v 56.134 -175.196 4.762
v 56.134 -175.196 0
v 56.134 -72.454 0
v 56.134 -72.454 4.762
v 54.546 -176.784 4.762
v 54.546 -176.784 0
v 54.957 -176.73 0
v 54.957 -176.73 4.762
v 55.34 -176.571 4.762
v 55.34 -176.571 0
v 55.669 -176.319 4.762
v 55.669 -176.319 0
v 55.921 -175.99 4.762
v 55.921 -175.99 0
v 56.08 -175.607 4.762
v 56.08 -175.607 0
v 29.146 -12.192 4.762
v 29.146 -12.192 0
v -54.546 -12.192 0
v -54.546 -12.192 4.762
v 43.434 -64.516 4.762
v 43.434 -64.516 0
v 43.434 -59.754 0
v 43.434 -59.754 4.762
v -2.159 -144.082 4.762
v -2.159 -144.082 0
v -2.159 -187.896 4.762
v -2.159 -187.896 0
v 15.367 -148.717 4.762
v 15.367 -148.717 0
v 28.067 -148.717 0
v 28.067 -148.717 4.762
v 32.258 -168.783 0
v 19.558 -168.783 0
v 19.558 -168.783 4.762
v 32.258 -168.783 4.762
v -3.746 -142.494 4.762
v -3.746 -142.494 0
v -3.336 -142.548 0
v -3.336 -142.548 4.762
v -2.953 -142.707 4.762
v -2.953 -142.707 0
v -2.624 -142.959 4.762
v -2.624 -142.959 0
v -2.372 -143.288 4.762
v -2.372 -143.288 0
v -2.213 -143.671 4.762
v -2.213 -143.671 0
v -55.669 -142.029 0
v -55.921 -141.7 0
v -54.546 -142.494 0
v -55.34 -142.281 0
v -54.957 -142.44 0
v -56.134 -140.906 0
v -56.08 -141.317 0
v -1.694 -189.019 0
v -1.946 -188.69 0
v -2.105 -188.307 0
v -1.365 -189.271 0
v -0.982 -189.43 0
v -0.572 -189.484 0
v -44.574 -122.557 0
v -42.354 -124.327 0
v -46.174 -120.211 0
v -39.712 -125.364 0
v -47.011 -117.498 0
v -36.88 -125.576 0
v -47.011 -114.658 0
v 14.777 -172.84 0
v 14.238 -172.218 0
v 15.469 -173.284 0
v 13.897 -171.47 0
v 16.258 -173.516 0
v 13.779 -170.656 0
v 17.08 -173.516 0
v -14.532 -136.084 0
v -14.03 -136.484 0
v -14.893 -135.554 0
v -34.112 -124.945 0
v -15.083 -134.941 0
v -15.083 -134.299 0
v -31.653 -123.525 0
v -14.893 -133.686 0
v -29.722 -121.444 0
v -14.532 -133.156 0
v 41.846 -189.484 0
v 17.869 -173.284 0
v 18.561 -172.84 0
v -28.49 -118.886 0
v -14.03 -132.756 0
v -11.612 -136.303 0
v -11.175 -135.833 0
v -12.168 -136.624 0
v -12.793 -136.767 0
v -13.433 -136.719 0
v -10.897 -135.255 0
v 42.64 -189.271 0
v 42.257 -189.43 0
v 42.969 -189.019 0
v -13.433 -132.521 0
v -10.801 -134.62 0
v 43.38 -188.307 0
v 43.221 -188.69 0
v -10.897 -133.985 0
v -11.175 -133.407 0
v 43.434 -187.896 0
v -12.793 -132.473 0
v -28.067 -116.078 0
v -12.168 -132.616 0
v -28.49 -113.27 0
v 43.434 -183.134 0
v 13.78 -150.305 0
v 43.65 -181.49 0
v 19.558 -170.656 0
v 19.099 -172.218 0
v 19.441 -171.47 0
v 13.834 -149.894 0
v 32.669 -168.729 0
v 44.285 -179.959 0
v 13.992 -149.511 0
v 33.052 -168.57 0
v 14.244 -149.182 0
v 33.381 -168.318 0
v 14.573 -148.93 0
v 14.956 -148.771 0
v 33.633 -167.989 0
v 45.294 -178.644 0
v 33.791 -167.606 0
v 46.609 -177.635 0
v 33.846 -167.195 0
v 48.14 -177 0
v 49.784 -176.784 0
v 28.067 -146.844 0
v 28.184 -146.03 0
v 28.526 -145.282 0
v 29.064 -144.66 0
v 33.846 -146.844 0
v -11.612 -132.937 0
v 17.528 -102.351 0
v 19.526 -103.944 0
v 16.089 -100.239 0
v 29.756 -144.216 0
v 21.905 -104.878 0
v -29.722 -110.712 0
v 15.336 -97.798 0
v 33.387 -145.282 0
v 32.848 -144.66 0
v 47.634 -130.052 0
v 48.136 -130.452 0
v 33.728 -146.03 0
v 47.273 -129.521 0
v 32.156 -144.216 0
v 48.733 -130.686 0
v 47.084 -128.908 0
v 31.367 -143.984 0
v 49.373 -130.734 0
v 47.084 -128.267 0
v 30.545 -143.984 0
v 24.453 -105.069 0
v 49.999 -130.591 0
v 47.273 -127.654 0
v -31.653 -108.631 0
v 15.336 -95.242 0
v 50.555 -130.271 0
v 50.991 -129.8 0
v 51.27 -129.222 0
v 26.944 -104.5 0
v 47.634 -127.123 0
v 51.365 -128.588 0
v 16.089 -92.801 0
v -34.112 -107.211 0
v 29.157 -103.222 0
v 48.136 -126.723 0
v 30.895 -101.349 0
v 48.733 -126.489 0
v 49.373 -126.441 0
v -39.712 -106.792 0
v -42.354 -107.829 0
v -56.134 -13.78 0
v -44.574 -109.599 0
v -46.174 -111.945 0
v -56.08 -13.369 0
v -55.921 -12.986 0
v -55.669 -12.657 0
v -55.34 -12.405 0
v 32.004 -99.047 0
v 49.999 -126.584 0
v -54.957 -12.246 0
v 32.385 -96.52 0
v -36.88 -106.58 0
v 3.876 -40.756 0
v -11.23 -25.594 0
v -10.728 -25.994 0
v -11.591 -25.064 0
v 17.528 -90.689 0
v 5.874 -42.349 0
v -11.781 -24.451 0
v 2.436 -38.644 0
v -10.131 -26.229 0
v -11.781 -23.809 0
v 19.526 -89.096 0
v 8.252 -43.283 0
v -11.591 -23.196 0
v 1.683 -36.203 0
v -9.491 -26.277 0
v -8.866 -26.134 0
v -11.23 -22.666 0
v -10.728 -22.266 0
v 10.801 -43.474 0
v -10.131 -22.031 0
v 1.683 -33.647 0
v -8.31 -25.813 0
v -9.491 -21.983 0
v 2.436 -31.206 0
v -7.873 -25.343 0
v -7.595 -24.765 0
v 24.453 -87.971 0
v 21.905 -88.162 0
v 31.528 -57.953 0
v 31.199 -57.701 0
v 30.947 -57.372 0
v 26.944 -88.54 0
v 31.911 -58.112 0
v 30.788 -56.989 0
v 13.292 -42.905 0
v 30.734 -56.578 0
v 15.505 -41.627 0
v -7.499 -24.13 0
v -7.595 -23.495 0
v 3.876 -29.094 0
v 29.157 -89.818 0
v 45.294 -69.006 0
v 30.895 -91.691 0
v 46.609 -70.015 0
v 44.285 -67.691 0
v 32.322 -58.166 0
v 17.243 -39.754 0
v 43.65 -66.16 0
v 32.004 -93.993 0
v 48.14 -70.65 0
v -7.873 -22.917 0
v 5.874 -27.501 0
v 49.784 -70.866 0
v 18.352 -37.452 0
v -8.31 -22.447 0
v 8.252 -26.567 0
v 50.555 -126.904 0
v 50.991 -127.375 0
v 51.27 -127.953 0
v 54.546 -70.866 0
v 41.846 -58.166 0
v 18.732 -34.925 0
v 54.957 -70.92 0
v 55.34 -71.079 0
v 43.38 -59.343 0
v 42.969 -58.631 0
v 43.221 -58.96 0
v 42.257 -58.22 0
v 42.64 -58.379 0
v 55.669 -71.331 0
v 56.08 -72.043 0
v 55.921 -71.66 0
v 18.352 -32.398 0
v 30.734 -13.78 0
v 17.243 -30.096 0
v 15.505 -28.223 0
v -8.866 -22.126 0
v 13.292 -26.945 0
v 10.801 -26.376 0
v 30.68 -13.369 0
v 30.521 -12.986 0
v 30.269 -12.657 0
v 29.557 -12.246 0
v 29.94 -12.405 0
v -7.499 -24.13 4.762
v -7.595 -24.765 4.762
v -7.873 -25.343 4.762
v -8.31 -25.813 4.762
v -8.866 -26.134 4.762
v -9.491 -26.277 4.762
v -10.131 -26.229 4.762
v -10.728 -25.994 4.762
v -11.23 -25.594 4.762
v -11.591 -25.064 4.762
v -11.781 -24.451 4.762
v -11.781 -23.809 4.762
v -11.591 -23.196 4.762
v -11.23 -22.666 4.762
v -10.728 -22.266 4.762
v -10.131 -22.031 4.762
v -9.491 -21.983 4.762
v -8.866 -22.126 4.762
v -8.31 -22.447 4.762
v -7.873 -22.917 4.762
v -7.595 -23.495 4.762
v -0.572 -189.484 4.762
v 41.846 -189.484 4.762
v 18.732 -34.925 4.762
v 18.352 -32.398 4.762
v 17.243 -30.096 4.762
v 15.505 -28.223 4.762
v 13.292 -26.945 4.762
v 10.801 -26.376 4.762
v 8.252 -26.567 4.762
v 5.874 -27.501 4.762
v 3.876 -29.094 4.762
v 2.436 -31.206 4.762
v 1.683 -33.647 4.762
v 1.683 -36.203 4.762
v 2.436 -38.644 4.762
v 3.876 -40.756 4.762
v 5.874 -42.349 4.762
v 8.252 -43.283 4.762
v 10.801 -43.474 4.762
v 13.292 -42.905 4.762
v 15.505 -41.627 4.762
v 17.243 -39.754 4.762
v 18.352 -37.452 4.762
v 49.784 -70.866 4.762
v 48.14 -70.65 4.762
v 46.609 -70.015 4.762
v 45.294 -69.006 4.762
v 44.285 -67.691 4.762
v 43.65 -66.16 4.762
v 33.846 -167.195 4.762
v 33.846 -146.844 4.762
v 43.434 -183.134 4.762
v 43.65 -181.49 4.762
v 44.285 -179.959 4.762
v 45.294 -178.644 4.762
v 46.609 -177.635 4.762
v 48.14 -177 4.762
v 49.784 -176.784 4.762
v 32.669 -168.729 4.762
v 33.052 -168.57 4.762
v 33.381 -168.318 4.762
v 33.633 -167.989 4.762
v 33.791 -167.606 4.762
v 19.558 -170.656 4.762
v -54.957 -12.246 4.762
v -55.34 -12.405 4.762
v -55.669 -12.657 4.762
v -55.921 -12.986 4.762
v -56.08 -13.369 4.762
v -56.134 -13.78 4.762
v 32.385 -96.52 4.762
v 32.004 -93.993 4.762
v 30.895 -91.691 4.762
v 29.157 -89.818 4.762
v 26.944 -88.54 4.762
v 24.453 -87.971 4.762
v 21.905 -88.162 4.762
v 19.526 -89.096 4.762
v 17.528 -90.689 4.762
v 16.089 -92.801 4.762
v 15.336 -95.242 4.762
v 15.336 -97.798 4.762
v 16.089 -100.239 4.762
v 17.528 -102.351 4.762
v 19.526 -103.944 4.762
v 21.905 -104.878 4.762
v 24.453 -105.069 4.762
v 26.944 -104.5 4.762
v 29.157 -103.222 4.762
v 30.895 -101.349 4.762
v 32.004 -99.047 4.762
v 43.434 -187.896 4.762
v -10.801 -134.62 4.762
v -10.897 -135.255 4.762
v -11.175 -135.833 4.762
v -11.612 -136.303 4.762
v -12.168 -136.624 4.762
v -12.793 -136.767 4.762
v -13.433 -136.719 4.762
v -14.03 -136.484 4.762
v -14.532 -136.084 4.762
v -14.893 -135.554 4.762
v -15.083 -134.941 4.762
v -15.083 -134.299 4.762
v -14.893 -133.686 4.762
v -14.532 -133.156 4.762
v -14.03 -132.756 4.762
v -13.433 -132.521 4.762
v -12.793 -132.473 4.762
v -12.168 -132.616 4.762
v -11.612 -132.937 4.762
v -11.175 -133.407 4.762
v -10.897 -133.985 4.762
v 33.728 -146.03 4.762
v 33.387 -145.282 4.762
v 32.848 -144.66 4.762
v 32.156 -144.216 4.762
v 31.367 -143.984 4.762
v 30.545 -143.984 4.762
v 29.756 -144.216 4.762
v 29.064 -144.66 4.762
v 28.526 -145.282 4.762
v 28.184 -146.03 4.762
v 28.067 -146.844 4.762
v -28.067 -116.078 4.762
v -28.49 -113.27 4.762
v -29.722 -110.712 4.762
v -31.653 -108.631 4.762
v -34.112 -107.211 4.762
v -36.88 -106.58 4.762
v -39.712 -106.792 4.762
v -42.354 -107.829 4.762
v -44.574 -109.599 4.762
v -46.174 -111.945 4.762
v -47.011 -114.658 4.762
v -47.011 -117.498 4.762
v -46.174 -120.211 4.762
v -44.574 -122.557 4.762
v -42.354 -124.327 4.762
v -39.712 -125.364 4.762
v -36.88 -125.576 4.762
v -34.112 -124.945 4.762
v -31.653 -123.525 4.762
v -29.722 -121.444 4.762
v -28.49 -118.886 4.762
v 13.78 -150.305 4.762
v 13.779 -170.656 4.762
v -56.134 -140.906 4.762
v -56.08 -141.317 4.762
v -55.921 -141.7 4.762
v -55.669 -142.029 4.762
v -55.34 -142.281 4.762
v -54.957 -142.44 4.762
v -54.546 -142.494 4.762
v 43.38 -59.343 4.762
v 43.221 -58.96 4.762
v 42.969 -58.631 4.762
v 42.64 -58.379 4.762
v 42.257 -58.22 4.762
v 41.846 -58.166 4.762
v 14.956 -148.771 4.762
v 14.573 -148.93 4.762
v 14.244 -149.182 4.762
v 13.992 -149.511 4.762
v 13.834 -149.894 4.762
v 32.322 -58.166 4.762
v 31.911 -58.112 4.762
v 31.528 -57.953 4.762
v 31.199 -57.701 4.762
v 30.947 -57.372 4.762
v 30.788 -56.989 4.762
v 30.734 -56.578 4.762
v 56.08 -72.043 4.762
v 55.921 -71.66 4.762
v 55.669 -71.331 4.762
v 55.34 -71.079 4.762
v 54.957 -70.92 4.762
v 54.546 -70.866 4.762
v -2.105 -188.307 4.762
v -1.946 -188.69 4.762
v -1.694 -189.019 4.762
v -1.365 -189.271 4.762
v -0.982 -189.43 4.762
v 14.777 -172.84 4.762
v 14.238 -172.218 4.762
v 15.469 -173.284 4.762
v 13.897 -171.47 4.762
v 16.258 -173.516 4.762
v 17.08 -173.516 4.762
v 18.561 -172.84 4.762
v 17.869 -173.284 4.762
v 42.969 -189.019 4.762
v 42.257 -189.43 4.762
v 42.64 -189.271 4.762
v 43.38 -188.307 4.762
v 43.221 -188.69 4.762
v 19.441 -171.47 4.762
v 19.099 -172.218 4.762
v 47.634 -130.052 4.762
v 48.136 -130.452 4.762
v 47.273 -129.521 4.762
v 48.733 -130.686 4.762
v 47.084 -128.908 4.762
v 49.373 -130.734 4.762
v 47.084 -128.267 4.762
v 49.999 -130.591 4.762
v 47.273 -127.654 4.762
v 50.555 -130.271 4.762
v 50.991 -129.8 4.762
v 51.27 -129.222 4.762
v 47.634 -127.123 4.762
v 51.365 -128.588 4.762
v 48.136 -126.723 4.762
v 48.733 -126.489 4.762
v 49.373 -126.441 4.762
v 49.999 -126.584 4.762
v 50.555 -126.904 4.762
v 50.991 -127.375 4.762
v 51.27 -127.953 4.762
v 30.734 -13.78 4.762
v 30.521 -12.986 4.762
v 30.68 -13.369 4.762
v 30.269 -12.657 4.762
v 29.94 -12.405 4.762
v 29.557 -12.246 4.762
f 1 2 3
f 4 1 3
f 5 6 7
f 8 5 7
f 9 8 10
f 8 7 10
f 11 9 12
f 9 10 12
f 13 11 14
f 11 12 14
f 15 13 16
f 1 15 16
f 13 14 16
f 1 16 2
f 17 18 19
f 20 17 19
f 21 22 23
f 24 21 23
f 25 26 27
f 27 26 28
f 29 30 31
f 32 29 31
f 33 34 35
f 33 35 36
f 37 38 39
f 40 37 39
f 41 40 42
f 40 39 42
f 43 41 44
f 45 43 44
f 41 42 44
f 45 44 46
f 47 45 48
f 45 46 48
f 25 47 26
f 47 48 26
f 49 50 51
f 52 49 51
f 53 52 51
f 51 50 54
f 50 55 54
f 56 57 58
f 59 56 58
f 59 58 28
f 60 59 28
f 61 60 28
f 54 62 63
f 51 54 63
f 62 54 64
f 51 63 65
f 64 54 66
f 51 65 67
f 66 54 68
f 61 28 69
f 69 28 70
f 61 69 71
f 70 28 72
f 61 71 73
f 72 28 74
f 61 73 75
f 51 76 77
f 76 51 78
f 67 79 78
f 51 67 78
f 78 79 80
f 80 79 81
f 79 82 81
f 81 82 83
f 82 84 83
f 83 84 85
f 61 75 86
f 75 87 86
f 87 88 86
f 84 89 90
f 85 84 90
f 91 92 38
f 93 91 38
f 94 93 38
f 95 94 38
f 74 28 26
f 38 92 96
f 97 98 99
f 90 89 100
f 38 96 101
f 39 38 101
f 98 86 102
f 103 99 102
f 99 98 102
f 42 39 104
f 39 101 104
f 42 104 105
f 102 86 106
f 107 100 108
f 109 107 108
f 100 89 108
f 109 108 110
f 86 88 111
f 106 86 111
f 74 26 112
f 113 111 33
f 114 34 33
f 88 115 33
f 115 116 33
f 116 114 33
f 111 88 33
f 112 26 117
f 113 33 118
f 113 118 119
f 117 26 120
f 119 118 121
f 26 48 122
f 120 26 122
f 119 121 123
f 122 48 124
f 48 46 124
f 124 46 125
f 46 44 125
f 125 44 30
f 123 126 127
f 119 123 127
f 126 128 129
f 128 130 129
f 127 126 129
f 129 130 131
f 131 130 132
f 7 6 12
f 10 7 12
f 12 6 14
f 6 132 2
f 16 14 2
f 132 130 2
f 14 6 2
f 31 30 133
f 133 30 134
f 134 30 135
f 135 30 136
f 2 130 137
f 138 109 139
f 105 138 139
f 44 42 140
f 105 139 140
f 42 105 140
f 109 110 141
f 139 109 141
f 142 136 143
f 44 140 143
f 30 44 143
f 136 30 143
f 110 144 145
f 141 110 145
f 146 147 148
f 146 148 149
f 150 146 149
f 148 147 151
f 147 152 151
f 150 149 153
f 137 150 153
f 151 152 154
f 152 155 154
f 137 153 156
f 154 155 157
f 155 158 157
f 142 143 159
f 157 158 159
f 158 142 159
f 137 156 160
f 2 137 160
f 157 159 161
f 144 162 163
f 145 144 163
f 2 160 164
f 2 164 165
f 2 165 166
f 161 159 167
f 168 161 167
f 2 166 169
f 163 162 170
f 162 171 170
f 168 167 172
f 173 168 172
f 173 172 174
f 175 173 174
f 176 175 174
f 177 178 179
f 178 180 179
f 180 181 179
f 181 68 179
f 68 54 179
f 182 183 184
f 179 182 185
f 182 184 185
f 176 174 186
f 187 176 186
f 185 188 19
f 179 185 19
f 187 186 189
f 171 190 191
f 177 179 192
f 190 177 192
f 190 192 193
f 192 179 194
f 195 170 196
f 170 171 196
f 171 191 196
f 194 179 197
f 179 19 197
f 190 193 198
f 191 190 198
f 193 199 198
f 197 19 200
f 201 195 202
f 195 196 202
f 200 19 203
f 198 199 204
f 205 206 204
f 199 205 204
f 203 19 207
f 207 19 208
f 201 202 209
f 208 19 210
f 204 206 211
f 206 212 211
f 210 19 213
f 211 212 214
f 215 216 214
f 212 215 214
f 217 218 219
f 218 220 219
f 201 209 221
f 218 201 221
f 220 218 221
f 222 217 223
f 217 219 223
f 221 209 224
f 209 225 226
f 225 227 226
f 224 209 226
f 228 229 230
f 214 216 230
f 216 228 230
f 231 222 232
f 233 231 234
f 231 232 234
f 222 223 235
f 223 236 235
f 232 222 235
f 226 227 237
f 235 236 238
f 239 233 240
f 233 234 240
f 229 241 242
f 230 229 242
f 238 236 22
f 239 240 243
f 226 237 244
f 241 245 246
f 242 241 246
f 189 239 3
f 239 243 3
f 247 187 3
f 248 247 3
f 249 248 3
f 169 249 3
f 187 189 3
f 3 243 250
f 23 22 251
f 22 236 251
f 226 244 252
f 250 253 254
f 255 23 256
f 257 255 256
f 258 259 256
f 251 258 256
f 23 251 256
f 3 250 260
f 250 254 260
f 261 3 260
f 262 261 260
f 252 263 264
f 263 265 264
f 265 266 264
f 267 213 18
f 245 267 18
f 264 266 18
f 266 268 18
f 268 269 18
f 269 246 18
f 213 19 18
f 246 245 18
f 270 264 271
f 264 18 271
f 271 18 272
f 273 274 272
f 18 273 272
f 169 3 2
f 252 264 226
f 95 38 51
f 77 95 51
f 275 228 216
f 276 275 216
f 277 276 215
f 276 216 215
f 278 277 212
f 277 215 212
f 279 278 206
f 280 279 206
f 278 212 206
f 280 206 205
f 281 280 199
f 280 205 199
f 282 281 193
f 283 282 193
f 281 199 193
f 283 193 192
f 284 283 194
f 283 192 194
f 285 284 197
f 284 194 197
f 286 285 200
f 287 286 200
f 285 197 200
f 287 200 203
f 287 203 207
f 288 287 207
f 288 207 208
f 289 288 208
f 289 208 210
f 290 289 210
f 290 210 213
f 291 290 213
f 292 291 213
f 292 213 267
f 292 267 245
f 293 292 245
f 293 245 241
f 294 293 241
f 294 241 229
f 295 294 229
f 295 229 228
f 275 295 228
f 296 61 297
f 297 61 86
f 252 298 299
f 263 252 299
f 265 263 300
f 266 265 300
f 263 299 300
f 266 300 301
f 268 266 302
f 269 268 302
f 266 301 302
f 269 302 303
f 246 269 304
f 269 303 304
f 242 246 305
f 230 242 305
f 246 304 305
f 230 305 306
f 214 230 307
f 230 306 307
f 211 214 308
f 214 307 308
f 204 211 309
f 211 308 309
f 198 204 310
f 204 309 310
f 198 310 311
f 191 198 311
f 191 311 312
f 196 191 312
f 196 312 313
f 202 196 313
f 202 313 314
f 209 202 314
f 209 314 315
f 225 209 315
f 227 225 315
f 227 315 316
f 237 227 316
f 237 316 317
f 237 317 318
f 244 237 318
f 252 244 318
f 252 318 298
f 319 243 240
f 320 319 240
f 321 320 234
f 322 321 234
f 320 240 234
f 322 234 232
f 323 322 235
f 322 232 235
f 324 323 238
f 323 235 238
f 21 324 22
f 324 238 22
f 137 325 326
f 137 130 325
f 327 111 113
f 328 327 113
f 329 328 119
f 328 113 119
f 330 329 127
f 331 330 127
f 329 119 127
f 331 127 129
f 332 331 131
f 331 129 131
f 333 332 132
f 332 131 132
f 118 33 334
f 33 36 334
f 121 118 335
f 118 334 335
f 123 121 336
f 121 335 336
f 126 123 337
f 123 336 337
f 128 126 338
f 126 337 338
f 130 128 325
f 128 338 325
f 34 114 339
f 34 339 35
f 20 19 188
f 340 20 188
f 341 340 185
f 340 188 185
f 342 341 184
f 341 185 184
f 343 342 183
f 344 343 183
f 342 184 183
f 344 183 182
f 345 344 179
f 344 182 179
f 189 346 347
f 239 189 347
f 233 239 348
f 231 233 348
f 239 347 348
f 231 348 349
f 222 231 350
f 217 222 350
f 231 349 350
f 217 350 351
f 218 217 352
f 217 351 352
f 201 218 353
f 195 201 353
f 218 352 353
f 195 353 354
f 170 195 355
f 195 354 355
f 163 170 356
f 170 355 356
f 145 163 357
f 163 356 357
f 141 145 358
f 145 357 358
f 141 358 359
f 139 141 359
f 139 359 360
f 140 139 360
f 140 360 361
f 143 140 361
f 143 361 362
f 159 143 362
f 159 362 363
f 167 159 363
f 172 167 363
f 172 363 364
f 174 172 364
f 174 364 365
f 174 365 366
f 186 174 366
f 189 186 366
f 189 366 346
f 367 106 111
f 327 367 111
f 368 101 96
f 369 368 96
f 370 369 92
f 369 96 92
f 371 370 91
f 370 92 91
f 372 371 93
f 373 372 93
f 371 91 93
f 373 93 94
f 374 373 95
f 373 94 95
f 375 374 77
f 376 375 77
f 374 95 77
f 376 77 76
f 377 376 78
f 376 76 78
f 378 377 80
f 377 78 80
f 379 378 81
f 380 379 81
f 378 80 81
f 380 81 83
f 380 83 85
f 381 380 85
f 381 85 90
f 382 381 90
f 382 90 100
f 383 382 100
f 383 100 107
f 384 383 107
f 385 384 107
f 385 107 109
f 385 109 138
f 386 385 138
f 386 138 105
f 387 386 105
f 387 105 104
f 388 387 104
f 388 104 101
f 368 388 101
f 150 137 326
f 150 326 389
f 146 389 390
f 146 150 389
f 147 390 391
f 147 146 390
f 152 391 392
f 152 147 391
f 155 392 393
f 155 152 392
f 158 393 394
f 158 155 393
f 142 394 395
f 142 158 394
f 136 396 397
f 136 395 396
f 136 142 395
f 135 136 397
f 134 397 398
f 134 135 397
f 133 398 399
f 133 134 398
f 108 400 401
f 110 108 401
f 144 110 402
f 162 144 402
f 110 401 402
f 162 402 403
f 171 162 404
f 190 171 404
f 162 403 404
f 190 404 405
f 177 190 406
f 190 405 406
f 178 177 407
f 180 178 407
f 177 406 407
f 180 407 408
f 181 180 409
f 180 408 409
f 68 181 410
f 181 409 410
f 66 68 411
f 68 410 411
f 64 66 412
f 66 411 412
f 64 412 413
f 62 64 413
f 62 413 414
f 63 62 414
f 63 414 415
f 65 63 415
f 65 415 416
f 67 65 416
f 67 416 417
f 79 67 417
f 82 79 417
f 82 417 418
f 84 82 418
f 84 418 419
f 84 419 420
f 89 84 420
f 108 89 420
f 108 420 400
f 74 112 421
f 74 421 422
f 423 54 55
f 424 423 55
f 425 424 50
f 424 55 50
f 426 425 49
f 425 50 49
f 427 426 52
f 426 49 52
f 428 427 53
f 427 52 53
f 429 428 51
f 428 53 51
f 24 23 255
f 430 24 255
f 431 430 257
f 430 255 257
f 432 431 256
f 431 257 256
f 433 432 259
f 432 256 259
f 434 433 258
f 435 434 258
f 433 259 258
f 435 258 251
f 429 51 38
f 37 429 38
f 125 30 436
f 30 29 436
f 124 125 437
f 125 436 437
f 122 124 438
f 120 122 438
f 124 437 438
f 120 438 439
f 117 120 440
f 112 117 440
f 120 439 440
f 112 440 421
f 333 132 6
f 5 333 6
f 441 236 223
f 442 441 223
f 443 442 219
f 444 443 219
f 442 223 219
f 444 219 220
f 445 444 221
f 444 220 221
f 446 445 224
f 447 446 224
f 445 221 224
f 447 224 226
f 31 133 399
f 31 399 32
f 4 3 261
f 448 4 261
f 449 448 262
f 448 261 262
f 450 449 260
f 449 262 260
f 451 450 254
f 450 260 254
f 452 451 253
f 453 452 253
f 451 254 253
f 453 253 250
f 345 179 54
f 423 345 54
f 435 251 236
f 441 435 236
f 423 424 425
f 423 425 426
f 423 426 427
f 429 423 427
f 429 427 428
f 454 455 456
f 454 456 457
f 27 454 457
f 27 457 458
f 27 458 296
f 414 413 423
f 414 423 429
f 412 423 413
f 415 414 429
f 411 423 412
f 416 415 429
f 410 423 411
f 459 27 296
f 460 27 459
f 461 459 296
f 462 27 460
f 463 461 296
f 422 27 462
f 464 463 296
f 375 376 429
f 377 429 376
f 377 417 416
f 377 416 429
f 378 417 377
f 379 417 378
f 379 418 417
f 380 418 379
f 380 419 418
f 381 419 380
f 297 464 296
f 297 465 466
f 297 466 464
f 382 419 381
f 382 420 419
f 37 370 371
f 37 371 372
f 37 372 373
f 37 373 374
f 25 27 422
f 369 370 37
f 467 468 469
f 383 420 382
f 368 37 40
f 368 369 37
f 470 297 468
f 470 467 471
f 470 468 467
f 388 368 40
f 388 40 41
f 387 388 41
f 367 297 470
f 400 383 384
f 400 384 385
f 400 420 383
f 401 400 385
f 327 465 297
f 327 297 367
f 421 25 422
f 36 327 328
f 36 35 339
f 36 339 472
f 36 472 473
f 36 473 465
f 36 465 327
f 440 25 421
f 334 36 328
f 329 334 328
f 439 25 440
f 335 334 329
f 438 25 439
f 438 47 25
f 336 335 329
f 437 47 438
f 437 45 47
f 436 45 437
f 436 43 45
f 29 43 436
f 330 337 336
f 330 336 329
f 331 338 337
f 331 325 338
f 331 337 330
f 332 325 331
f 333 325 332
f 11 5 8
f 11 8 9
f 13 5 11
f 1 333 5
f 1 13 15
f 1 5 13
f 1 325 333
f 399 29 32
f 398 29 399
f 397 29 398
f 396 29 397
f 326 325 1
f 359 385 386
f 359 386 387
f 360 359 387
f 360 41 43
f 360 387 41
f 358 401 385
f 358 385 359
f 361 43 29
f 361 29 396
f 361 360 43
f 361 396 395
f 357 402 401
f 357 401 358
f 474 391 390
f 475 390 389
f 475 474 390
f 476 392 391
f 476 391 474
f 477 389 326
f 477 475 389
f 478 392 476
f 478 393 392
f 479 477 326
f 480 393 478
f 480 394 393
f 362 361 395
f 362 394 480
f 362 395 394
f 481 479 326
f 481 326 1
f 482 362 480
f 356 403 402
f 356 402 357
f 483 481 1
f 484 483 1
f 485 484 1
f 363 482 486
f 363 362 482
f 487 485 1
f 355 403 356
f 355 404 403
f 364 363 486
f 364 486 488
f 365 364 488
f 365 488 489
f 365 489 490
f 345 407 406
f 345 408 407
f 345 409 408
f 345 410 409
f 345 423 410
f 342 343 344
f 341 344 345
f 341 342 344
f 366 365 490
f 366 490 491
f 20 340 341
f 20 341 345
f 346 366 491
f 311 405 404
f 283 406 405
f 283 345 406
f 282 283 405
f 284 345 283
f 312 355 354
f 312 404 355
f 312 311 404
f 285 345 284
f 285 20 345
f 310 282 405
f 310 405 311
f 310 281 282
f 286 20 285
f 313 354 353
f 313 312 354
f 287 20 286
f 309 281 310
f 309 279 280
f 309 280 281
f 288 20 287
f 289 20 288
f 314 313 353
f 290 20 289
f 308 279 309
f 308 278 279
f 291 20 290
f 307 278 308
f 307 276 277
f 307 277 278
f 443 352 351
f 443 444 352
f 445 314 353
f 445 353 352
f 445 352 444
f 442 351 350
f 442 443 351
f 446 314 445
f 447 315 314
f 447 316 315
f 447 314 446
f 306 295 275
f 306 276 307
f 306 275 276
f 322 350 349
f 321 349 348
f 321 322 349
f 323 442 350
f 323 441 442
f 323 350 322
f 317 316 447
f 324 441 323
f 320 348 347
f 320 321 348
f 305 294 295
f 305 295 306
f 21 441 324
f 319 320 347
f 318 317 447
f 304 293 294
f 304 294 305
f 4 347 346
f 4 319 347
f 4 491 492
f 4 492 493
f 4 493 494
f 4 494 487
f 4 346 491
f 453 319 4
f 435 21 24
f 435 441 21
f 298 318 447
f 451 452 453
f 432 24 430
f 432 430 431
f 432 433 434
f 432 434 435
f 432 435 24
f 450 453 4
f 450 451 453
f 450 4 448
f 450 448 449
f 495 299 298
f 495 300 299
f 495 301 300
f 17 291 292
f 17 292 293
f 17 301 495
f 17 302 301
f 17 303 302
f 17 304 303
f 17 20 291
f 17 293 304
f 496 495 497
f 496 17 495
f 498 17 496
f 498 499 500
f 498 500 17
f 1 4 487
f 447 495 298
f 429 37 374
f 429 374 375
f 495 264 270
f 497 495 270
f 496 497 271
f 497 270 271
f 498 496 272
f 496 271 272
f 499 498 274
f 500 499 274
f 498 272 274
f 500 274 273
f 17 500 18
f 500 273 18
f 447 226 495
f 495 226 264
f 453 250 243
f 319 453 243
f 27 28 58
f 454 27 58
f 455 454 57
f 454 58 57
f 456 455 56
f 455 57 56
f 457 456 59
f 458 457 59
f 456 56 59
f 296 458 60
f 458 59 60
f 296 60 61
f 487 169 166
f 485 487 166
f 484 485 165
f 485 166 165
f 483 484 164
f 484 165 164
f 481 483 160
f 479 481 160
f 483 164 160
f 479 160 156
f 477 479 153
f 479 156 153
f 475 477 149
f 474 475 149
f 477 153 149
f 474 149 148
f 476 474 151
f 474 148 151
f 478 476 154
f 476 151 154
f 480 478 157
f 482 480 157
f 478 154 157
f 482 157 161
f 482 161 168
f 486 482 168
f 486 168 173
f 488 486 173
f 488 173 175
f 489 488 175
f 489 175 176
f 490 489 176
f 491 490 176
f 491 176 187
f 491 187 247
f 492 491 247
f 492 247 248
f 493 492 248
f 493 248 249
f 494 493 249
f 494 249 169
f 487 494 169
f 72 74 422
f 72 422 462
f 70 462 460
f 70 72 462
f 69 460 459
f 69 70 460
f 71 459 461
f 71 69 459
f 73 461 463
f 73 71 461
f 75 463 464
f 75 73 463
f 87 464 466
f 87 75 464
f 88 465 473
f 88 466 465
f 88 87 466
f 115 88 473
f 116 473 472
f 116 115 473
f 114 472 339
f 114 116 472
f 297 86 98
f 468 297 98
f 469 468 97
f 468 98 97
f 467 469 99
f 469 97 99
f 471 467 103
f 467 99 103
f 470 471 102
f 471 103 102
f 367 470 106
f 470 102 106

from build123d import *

# Parameters (mm, degrees)
SKETCH3_W             = 20.066
SKETCH3_H             = 20.066
BOSS_EXTRUDE1_DEPTH   = 4.7625
SKETCH6_R             = 8.5725
CUT_EXTRUDE4_DEPTH    = 5.7625
SKETCH61_R            = 8.5725
CUT_EXTRUDE41_DEPTH   = 5.7625
SKETCH62_R            = 9.525
CUT_EXTRUDE42_DEPTH   = 5.7625
F_6_CLEARANCE_HOLE1_D = 4.3053
CUT_EXTRUDE43_REACH   = 6.763
FILLET1_R             = 1.5875


with BuildPart() as part:
    # Sketch3 → Boss-Extrude1 (new body)
    with BuildSketch(Plane.XY):
        with BuildLine():
            Line((-0.5715, -189.484), (41.8465, -189.484))
            ThreePointArc((41.8465, -189.484), (42.969032015, -189.019032015), (43.434, -187.8965))
            Line((43.434, -187.8965), (43.434, -183.134))
            ThreePointArc((43.434, -183.134), (45.293871939, -178.643871939), (49.784, -176.784))
            Line((49.784, -176.784), (54.5465, -176.784))
            ThreePointArc((54.5465, -176.784), (55.669032015, -176.319032015), (56.134, -175.1965))
            Line((56.134, -175.1965), (56.134, -72.4535))
            ThreePointArc((56.134, -72.4535), (55.669032015, -71.330967985), (54.5465, -70.866))
            Line((54.5465, -70.866), (49.784, -70.866))
            ThreePointArc((49.784, -70.866), (45.293871939, -69.006128061), (43.434, -64.516))
            Line((43.434, -64.516), (43.434, -59.7535))
            ThreePointArc((43.434, -59.7535), (42.969032015, -58.630967985), (41.8465, -58.166))
            Line((41.8465, -58.166), (32.3215, -58.166))
            ThreePointArc((32.3215, -58.166), (31.198967985, -57.701032015), (30.734, -56.5785))
            Line((30.734, -56.5785), (30.734, -13.7795))
            ThreePointArc((30.734, -13.7795), (30.269032015, -12.656967985), (29.1465, -12.192))
            Line((29.1465, -12.192), (-54.5465, -12.192))
            ThreePointArc((-54.5465, -12.192), (-55.669032015, -12.656967985), (-56.134, -13.7795))
            Line((-56.134, -13.7795), (-56.134, -140.9065))
            ThreePointArc((-56.134, -140.9065), (-55.669032015, -142.029032015), (-54.5465, -142.494))
            Line((-54.5465, -142.494), (-3.7465, -142.494))
            ThreePointArc((-3.7465, -142.494), (-2.623967985, -142.958967985), (-2.159, -144.0815))
            Line((-2.159, -144.0815), (-2.159, -187.8965))
            ThreePointArc((-2.159, -187.8965), (-1.694032015, -189.019032015), (-0.5715, -189.484))
        make_face()
        with Locations((23.8125, -158.75)):
            Rectangle(SKETCH3_W, SKETCH3_H, mode=Mode.SUBTRACT)
    extrude(amount=BOSS_EXTRUDE1_DEPTH)

    # Sketch6 → Cut-Extrude4 (cut, through all)
    with BuildSketch(Plane(origin=(161.486140968, -518.011138809, 4.7625), x_dir=(1, 0, 0), z_dir=(0, 0, 1))):
        with Locations((-137.673640968, 421.491138809)):
            Circle(SKETCH6_R)
    extrude(amount=-CUT_EXTRUDE4_DEPTH, mode=Mode.SUBTRACT)

    # Sketch61 → Cut-Extrude41 (cut, through all)
    with BuildSketch(Plane(origin=(147.833640968, -456.416138809, 4.7625), x_dir=(1, 0, 0), z_dir=(0, 0, 1))):
        with Locations((-137.673640968, 421.491138809)):
            Circle(SKETCH61_R)
    extrude(amount=-CUT_EXTRUDE41_DEPTH, mode=Mode.SUBTRACT)

    # Sketch62 → Cut-Extrude42 (cut, through all)
    with BuildSketch(Plane.XY.offset(4.7625)):
        with Locations((-37.592, -116.078)):
            Circle(SKETCH62_R)
    extrude(amount=-CUT_EXTRUDE42_DEPTH, mode=Mode.SUBTRACT)

    # #6 Clearance Hole1 (through all)
    with Locations(Plane(origin=(36.5125, -265.1125, 6.35), x_dir=(-1, 0, 0), z_dir=(0, 0, 1))):
        with Locations((49.4665, -130.4925), (-12.7, -136.525), (46.1645, -240.9825)):
            Hole(F_6_CLEARANCE_HOLE1_D / 2)

    # Sketch67 → Cut-Extrude43 (cut, up to next)
    with BuildSketch(Plane(origin=(0, 0, 0), x_dir=(-1, 0, 0), z_dir=(0, 0, -1)), mode=Mode.PRIVATE) as cut_extrude43_sk1:
        with BuildLine():
            Line((-19.558, -170.65625), (-19.558, -167.48125))
            ThreePointArc((-19.558, -167.48125), (-16.66875, -164.592), (-13.7795, -167.48125))
            Line((-13.7795, -167.48125), (-13.7795, -170.65625))
            ThreePointArc((-13.7795, -170.65625), (-16.66875, -173.5455), (-19.558, -170.65625))
        make_face()
    cut_extrude43_tool1 = extrude(cut_extrude43_sk1.sketch, amount=-CUT_EXTRUDE43_REACH, mode=Mode.PRIVATE) & part.part
    add(cut_extrude43_tool1.solids().sort_by_distance((16.66875, -169.06875, 0))[0], mode=Mode.SUBTRACT)
    # Sketch67 → Cut-Extrude43 (cut, up to next)
    with BuildSketch(Plane(origin=(0, 0, 0), x_dir=(-1, 0, 0), z_dir=(0, 0, -1)), mode=Mode.PRIVATE) as cut_extrude43_sk2:
        with BuildLine():
            Line((-28.067, -146.84375), (-28.067, -150.01875))
            ThreePointArc((-28.067, -150.01875), (-30.95625, -152.908), (-33.8455, -150.01875))
            Line((-33.8455, -150.01875), (-33.8455, -146.84375))
            ThreePointArc((-33.8455, -146.84375), (-30.95625, -143.9545), (-28.067, -146.84375))
        make_face()
    cut_extrude43_tool2 = extrude(cut_extrude43_sk2.sketch, amount=-CUT_EXTRUDE43_REACH, mode=Mode.PRIVATE) & part.part
    add(cut_extrude43_tool2.solids().sort_by_distance((30.95625, -148.43125, 0))[0], mode=Mode.SUBTRACT)

    # Fillet1
    fillet1_edges = [part.edges().sort_by_distance(p)[0] for p in [
        (33.8455, -168.783, 2.38125),
        (13.7795, -148.717, 2.38125),
    ]]
    fillet(fillet1_edges, radius=FILLET1_R)


solid = part.part
